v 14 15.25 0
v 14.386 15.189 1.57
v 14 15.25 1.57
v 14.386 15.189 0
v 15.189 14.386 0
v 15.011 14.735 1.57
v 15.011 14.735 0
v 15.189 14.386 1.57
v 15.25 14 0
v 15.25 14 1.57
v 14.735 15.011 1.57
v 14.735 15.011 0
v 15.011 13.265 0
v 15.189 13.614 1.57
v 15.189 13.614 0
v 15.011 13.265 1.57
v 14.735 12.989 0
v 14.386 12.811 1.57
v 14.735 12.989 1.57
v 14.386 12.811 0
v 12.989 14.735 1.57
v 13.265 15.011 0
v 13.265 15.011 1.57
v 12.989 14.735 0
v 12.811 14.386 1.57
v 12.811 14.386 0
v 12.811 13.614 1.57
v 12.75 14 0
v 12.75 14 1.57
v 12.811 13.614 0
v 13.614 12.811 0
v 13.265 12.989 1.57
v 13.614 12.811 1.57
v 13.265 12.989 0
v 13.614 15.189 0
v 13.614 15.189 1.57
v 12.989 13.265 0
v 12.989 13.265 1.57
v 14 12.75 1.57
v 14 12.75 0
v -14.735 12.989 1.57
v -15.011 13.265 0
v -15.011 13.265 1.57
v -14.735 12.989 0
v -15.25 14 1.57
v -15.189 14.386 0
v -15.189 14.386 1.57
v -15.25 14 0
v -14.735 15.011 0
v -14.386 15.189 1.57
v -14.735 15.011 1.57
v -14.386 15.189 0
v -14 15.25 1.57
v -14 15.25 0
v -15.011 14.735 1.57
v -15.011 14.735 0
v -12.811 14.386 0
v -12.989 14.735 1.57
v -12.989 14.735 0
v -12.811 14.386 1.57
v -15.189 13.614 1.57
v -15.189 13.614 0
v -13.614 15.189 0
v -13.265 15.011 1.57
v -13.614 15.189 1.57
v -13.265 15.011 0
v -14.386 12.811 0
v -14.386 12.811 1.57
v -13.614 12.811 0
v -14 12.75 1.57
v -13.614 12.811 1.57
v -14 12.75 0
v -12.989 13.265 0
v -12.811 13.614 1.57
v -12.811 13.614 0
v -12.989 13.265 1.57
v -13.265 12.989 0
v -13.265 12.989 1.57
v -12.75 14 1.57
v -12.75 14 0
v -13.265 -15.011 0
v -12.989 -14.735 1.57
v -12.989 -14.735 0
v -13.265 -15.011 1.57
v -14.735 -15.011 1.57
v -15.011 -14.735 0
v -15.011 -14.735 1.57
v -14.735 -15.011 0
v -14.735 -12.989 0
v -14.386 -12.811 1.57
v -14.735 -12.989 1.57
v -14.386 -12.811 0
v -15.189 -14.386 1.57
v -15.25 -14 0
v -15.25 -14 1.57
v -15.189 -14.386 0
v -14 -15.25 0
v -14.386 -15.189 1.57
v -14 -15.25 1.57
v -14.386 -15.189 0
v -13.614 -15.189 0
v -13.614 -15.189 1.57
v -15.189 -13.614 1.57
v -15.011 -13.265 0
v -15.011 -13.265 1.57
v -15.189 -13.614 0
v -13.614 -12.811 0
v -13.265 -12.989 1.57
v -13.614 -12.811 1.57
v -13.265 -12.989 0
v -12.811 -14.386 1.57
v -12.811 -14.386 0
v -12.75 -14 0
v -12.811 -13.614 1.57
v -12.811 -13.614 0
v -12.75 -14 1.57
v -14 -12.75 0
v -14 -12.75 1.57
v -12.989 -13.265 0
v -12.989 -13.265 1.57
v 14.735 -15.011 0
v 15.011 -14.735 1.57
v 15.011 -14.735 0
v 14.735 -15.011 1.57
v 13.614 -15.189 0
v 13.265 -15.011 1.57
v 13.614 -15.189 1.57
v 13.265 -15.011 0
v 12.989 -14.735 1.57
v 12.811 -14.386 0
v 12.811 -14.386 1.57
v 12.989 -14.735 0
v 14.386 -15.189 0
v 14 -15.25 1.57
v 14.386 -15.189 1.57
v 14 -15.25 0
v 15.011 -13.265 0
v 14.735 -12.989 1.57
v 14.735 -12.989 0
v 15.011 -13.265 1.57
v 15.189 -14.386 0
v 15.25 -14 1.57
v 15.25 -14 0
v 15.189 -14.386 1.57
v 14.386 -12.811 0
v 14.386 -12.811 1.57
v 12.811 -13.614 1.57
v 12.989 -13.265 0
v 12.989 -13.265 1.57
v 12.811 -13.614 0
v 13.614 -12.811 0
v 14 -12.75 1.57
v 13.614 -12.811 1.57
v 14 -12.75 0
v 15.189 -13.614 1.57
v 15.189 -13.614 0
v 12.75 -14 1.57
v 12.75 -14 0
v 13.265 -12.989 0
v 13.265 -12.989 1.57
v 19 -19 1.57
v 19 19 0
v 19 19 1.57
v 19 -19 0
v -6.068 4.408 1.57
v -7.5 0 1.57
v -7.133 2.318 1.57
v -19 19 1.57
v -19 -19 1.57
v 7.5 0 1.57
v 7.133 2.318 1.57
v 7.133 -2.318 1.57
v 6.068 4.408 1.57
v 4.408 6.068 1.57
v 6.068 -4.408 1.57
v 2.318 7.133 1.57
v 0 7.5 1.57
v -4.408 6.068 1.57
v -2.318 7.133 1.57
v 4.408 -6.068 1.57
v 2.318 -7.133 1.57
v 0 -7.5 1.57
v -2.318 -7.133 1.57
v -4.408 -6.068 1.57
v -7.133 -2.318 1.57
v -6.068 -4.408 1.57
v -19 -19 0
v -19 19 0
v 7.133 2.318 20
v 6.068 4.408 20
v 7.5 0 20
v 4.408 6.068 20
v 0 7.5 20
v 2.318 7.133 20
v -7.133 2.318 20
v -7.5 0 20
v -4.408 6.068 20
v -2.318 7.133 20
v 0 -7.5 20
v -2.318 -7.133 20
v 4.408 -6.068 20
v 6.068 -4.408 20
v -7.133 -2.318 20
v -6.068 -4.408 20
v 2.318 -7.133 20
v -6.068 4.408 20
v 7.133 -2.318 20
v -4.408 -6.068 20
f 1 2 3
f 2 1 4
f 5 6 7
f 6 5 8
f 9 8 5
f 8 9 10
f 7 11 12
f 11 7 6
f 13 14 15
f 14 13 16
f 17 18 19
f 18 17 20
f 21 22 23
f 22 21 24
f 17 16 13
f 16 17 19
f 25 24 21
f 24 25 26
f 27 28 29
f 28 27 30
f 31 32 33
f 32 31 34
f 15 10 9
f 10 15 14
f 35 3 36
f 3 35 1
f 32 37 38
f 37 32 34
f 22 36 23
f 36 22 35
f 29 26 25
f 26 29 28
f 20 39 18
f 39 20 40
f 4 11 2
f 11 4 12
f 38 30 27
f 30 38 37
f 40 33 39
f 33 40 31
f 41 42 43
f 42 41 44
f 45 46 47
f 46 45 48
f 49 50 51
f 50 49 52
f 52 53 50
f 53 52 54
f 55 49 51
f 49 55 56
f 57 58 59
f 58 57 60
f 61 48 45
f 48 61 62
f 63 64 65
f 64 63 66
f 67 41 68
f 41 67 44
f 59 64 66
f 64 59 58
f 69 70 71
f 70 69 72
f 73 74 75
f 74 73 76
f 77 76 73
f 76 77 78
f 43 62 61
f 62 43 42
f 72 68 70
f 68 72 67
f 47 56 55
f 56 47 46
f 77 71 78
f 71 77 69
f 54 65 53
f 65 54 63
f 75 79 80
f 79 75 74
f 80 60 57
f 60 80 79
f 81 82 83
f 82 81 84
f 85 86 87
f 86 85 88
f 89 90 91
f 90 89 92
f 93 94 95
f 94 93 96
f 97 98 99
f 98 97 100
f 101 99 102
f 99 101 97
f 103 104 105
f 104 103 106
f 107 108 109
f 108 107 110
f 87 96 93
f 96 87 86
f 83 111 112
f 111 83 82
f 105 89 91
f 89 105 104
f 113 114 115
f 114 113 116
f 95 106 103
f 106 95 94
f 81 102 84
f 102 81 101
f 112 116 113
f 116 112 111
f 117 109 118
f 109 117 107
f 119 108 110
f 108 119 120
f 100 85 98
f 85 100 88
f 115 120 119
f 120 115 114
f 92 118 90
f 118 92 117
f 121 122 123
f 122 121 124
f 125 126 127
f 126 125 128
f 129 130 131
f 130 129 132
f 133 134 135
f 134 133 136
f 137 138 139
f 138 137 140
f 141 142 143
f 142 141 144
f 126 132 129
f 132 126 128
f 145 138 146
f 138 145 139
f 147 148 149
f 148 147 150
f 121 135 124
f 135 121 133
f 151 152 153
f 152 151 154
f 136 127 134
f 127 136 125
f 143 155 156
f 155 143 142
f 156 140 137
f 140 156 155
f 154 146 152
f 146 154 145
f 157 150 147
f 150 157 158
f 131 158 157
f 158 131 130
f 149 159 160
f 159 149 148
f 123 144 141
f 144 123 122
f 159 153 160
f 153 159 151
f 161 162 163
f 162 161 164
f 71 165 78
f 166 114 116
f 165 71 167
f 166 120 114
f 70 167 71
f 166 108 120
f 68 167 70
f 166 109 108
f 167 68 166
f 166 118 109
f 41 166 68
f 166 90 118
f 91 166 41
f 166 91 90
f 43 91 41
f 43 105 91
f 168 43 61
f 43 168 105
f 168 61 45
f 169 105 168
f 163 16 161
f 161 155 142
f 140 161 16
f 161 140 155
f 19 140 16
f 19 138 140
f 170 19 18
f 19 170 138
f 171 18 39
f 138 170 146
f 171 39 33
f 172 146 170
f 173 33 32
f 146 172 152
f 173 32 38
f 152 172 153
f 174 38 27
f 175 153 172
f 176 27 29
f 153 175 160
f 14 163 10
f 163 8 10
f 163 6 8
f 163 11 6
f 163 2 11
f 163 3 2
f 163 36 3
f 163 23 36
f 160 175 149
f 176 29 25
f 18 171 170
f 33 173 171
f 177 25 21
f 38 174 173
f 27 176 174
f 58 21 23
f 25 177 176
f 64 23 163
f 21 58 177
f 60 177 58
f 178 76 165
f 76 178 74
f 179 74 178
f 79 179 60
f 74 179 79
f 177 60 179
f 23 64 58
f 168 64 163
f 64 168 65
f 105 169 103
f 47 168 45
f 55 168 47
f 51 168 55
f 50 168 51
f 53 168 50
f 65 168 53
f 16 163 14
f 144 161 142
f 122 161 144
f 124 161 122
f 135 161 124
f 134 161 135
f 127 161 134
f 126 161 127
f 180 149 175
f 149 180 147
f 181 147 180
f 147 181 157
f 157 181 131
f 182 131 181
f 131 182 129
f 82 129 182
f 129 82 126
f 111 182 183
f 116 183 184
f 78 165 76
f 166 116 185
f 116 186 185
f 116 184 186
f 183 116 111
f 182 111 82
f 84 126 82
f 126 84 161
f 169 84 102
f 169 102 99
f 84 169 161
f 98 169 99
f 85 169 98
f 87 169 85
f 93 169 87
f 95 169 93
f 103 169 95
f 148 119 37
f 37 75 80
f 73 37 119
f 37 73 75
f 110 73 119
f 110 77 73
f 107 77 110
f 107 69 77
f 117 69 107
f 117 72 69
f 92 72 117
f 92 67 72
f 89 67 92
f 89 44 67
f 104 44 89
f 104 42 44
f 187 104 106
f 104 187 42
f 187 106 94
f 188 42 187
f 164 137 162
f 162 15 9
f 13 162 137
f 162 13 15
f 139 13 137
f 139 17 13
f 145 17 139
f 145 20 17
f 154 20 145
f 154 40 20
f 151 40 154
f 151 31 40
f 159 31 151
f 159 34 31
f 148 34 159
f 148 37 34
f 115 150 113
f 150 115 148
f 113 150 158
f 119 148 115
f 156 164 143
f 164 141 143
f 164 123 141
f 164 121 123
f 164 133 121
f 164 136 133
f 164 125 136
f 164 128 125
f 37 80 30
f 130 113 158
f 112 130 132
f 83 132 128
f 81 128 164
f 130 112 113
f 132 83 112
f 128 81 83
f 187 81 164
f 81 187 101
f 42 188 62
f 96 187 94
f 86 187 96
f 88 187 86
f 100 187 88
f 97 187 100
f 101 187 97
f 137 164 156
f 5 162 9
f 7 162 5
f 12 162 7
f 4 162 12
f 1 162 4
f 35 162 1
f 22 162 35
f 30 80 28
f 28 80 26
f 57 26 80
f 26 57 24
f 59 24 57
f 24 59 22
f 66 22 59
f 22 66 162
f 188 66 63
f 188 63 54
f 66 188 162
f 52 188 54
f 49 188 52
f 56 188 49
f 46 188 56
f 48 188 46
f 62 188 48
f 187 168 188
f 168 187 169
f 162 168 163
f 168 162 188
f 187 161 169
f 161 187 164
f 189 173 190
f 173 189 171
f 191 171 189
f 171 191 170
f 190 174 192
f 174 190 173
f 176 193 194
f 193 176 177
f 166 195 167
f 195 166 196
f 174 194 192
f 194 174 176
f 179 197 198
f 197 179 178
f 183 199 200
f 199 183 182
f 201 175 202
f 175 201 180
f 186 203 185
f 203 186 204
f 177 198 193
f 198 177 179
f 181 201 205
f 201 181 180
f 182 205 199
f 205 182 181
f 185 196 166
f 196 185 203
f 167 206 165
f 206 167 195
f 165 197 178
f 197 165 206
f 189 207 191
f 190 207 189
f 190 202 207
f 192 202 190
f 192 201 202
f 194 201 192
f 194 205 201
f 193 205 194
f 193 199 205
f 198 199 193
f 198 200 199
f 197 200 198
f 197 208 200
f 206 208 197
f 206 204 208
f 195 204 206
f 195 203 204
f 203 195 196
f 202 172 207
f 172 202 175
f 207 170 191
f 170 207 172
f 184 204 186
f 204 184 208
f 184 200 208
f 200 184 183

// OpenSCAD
// file: ../utils/struct.scad
function get(config, key) = config[search([key], config)[0]][1];

function set(config, key, value) = [for (elem = config) if (elem[0] != key) elem, [key, value]];
    
function join(config1, config2) = [for (elem = config1) elem, for (elem = config2) elem];
// main file
use <../utils/struct.scad>

function RaspiCamera_config() =
        let (
            pcb_height = 1.57,
            width = 38,
            bore_distance = 28,
            bore_diameter = 2.5,
            lens_screws_distance = 29,
            screw_head_diameter = 2.5,
            lens_height = 20,
            lens_diameter = 15
        ) [
            ["pcb_height", pcb_height],
            ["width", width],
            ["bore_distance", bore_distance],
            ["bore_diameter", bore_diameter],
            ["lens_screws_distance", lens_screws_distance],
            ["screw_head_diameter", screw_head_diameter],
            ["lens_height", lens_height],
            ["lens_diameter", lens_diameter],
        ];

module RaspiCamera(config) {
    width = get(config, "width");
    pcb_height = get(config, "pcb_height");
    
    difference() {
        translate([-width/2, -width/2, 0])
        cube([width, width, pcb_height]);
        
        for (i = [0, 90, 180, 270]) {
            rotate([0, 0, i])
            translate([get(config, "bore_distance")/2, get(config, "bore_distance")/2, -1])
            cylinder($fn=20, d = get(config, "bore_diameter"), h = 10);
        }
    }
    
    cylinder($fn=20, d = get(config, "lens_diameter"), h = get(config, "lens_height"));
};

RaspiCamera(RaspiCamera_config());
